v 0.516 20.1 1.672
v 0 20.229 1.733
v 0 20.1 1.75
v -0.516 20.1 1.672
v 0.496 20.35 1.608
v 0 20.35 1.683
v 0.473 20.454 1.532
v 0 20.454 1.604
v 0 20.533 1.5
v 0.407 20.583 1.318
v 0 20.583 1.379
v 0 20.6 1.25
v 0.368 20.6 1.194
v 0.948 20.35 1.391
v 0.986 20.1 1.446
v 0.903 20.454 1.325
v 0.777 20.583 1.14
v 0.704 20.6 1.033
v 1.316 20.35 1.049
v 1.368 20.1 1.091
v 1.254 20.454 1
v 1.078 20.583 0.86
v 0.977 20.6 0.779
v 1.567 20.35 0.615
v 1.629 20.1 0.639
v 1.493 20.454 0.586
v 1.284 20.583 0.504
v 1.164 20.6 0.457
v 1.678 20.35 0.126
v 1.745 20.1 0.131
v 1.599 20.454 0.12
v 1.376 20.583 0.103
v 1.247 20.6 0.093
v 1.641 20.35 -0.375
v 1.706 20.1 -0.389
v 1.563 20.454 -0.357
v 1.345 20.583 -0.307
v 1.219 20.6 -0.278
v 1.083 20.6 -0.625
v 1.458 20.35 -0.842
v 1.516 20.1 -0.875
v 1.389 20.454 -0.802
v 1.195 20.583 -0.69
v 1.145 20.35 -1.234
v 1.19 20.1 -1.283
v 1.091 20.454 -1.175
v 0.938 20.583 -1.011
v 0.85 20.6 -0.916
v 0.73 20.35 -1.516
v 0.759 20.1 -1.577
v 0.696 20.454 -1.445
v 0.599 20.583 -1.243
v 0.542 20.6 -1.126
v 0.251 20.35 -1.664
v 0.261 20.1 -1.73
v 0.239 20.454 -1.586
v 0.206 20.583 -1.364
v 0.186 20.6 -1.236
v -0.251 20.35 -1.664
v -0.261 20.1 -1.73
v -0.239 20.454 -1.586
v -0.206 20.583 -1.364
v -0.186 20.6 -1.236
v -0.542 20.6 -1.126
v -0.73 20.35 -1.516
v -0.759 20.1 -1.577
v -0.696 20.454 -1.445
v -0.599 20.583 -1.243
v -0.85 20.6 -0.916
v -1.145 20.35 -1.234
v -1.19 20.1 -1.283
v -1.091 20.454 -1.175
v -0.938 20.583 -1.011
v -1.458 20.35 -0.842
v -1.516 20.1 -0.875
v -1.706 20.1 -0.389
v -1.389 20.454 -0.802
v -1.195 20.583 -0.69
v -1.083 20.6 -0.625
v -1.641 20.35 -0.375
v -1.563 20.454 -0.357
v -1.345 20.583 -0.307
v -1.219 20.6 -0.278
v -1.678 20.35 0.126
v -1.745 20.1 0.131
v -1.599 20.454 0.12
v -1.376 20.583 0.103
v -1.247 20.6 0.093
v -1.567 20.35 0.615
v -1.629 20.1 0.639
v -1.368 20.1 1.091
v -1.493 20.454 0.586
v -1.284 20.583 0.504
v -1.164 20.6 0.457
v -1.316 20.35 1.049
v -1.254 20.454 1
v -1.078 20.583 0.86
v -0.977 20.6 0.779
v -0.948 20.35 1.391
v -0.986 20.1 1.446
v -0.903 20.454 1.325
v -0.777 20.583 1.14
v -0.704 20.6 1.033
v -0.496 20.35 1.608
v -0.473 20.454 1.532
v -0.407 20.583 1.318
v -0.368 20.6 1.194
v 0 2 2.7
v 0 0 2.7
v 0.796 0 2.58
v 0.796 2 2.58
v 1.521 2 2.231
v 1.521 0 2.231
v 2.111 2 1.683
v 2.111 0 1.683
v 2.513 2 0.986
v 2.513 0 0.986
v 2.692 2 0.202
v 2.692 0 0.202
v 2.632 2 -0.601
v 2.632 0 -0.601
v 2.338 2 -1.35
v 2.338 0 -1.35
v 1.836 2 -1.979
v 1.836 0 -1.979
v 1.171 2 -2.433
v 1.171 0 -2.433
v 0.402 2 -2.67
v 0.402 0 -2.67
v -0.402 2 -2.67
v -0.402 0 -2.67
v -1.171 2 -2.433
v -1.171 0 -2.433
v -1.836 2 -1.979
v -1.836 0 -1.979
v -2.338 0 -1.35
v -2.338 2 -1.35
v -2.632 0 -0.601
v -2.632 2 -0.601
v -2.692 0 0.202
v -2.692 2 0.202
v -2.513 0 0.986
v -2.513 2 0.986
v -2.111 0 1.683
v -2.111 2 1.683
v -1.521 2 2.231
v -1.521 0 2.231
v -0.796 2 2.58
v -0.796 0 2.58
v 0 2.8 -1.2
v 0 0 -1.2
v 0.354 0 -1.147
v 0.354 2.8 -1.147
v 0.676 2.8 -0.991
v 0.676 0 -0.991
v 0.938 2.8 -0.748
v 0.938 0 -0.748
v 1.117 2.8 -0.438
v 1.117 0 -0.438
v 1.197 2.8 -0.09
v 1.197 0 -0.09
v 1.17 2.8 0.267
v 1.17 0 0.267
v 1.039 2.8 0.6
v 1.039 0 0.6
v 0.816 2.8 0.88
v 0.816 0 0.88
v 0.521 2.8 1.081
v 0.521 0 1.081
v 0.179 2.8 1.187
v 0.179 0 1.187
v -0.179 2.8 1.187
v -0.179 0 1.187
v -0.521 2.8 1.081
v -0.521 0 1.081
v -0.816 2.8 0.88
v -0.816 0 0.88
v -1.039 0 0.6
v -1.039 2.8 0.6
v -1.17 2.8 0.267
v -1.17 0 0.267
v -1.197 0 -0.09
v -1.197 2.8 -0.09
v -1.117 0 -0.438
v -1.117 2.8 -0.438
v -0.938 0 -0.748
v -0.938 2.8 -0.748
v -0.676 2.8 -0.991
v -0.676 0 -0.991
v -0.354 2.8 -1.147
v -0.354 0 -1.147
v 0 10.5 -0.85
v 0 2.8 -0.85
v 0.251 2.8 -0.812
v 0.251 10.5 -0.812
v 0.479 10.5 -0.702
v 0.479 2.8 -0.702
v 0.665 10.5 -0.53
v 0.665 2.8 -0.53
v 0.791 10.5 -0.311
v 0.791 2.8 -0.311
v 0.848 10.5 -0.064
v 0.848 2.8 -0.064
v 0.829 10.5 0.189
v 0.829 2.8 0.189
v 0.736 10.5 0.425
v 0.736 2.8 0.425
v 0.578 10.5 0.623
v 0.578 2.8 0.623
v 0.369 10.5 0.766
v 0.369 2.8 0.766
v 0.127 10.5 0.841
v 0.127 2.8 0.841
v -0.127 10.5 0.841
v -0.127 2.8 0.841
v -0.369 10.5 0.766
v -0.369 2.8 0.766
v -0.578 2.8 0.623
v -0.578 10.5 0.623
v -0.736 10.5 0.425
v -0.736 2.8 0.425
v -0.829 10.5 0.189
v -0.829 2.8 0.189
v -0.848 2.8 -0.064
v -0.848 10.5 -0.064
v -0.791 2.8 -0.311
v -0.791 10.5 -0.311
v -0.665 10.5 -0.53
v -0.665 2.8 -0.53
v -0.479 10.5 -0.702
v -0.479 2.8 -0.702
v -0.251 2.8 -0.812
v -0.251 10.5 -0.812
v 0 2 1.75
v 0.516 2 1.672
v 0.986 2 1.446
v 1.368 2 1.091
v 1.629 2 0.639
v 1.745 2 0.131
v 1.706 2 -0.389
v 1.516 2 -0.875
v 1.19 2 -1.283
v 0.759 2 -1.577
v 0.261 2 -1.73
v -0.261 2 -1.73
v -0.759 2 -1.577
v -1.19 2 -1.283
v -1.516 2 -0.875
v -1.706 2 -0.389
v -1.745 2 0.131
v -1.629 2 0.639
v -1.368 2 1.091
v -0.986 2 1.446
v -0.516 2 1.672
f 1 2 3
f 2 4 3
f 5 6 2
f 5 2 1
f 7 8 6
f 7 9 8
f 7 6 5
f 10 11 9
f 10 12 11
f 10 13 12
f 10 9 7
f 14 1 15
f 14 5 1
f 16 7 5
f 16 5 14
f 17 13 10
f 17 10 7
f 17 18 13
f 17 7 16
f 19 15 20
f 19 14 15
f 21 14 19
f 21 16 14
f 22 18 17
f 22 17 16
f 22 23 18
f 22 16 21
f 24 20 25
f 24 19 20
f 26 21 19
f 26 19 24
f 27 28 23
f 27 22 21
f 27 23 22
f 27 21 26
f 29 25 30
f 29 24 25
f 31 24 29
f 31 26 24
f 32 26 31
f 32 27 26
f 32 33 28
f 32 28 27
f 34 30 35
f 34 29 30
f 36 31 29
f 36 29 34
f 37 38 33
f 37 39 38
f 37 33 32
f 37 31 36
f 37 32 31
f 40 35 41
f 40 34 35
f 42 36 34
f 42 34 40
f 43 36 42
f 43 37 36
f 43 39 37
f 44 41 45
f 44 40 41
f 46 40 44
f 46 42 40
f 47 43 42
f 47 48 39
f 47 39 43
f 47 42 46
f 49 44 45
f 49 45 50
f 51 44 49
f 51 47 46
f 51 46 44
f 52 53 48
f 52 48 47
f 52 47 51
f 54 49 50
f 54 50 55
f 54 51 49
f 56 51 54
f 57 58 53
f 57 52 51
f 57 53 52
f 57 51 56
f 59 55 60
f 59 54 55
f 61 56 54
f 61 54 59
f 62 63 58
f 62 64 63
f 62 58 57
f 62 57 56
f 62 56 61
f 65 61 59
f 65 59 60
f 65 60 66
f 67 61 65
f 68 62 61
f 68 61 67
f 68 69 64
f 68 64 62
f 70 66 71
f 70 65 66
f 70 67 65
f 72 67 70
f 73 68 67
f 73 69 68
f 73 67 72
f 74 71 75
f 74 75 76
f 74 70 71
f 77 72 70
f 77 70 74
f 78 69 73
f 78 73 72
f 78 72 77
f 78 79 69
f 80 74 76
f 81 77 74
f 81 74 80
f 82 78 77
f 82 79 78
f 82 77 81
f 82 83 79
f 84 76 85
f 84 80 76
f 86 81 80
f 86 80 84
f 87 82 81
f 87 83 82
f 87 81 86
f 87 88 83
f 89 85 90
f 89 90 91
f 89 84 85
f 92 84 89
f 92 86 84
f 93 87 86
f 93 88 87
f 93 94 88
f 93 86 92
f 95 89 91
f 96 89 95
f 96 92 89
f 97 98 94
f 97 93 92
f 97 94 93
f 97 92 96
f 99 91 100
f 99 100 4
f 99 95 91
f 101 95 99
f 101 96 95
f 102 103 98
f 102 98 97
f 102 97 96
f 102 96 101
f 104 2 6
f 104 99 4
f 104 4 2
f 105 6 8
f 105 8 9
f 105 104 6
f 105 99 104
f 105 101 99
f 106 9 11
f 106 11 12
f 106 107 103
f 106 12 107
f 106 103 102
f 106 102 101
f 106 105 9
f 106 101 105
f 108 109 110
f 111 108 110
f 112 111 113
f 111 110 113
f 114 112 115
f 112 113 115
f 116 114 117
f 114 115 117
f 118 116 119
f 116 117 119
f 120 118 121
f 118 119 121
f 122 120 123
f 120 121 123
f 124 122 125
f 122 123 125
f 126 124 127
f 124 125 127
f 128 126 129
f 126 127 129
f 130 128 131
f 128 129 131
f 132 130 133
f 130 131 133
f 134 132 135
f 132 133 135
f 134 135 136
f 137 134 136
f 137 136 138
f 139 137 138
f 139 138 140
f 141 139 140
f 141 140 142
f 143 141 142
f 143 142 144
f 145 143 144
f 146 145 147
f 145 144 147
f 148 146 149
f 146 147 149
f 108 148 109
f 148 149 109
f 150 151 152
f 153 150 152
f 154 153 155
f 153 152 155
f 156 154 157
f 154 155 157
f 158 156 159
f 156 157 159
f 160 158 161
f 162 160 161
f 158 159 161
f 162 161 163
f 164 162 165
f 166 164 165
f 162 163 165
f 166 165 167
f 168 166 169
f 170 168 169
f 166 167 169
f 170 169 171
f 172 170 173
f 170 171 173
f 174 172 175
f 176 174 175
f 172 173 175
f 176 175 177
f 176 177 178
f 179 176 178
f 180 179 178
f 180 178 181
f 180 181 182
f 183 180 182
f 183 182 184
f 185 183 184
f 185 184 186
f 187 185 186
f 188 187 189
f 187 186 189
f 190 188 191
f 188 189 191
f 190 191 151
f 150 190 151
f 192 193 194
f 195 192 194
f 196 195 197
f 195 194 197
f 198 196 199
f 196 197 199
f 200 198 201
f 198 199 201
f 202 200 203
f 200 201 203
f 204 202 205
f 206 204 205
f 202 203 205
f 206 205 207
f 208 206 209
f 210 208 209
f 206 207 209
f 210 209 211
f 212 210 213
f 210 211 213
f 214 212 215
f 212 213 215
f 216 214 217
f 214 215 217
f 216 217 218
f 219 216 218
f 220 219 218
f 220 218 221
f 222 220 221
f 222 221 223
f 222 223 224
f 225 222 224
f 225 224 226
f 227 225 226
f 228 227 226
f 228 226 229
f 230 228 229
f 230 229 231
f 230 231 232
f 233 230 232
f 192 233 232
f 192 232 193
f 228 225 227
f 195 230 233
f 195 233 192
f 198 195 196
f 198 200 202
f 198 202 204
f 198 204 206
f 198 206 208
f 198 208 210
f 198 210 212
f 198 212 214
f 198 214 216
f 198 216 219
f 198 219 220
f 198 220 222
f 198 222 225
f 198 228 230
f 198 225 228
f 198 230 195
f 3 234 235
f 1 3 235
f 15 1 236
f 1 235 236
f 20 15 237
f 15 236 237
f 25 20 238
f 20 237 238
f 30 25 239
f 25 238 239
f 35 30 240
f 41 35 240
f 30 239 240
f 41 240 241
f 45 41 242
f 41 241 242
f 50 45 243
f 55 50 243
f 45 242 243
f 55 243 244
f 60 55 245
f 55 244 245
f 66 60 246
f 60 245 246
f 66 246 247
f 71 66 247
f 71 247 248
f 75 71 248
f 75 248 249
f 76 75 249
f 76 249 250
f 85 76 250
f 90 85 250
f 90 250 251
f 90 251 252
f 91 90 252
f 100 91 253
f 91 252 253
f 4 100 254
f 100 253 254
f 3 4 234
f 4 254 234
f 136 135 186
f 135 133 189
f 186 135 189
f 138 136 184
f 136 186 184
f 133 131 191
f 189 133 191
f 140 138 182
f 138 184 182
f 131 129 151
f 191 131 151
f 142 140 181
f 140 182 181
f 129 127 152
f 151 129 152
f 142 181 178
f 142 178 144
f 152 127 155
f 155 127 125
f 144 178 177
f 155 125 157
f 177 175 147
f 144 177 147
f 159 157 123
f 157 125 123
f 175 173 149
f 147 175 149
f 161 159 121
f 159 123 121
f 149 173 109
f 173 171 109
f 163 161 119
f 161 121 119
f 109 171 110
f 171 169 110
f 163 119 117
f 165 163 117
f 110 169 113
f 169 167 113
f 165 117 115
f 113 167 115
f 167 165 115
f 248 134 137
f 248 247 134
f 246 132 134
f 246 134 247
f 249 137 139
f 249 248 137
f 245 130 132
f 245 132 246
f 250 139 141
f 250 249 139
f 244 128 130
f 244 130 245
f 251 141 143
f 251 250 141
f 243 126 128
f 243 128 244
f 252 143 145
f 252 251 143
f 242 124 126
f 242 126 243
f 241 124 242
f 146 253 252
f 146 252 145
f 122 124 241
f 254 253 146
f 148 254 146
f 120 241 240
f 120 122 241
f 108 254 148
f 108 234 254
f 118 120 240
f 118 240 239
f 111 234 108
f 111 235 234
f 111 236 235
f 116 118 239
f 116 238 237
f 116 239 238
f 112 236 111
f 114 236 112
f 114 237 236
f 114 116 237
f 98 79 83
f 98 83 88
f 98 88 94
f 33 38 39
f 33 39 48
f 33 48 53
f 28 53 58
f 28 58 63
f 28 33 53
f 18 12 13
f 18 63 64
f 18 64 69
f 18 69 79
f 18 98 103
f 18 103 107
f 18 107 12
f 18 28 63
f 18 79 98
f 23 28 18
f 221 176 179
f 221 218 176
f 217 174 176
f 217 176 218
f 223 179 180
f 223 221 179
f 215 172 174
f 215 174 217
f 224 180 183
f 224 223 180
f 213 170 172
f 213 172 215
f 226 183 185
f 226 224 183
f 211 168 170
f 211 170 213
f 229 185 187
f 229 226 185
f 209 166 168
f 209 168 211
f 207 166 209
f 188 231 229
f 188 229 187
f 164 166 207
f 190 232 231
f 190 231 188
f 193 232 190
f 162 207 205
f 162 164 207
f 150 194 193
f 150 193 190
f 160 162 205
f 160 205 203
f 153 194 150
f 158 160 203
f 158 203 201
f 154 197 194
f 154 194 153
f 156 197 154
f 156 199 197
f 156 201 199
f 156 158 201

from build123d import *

# Parameters (mm, degrees)
SKETCH1_R           = 2.7
BOSS_EXTRUDE1_DEPTH = 2
SKETCH3_R           = 0.95
CUT_EXTRUDE2_DEPTH  = 9.5
SKETCH2_R           = 1.75
BOSS_EXTRUDE2_DEPTH = 18.6
SKETCH7_R           = 1.2
CUT_EXTRUDE4_DEPTH  = 2.8
FILLET2_R           = 0.5
SKETCH8_R           = 0.85
CUT_EXTRUDE5_DEPTH  = 10.5


with BuildPart() as part:
    # Sketch1 → Boss-Extrude1 (new body)
    with BuildSketch(Plane(origin=(0, 0, 0), x_dir=(1, 0, 0), z_dir=(0, 1, 0))):
        with Locations(Location((0, 0, 0), (0, 0, 270))):
            Circle(SKETCH1_R)
    extrude(amount=BOSS_EXTRUDE1_DEPTH)

    # Sketch3 → Cut-Extrude2 (cut)
    with BuildSketch(Plane.XZ):
        with Locations(Location((0, 0, 0), (0, 0, 270))):
            Circle(SKETCH3_R)
    extrude(amount=-CUT_EXTRUDE2_DEPTH, mode=Mode.SUBTRACT)

    # Sketch2 → Boss-Extrude2 (add)
    with BuildSketch(Plane(origin=(0, 2, 0), x_dir=(1, 0, 0), z_dir=(0, 1, 0))):
        with Locations(Location((0, 0, 0), (0, 0, 270))):
            Circle(SKETCH2_R)
    extrude(amount=BOSS_EXTRUDE2_DEPTH)

    # Sketch7 → Cut-Extrude4 (cut)
    with BuildSketch(Plane.XZ):
        with Locations(Location((0, 0, 0), (0, 0, 270))):
            Circle(SKETCH7_R)
    extrude(amount=-CUT_EXTRUDE4_DEPTH, mode=Mode.SUBTRACT)

    # Fillet2
    fillet2_edges = [part.edges().sort_by_distance(p)[0] for p in [
        (0, 20.6, -1.75),
    ]]
    fillet(fillet2_edges, radius=FILLET2_R)

    # Sketch8 → Cut-Extrude5 (cut)
    with BuildSketch(Plane.XZ):
        with Locations(Location((0, 0, 0), (0, 0, 270))):
            Circle(SKETCH8_R)
    extrude(amount=-CUT_EXTRUDE5_DEPTH, mode=Mode.SUBTRACT)


solid = part.part
